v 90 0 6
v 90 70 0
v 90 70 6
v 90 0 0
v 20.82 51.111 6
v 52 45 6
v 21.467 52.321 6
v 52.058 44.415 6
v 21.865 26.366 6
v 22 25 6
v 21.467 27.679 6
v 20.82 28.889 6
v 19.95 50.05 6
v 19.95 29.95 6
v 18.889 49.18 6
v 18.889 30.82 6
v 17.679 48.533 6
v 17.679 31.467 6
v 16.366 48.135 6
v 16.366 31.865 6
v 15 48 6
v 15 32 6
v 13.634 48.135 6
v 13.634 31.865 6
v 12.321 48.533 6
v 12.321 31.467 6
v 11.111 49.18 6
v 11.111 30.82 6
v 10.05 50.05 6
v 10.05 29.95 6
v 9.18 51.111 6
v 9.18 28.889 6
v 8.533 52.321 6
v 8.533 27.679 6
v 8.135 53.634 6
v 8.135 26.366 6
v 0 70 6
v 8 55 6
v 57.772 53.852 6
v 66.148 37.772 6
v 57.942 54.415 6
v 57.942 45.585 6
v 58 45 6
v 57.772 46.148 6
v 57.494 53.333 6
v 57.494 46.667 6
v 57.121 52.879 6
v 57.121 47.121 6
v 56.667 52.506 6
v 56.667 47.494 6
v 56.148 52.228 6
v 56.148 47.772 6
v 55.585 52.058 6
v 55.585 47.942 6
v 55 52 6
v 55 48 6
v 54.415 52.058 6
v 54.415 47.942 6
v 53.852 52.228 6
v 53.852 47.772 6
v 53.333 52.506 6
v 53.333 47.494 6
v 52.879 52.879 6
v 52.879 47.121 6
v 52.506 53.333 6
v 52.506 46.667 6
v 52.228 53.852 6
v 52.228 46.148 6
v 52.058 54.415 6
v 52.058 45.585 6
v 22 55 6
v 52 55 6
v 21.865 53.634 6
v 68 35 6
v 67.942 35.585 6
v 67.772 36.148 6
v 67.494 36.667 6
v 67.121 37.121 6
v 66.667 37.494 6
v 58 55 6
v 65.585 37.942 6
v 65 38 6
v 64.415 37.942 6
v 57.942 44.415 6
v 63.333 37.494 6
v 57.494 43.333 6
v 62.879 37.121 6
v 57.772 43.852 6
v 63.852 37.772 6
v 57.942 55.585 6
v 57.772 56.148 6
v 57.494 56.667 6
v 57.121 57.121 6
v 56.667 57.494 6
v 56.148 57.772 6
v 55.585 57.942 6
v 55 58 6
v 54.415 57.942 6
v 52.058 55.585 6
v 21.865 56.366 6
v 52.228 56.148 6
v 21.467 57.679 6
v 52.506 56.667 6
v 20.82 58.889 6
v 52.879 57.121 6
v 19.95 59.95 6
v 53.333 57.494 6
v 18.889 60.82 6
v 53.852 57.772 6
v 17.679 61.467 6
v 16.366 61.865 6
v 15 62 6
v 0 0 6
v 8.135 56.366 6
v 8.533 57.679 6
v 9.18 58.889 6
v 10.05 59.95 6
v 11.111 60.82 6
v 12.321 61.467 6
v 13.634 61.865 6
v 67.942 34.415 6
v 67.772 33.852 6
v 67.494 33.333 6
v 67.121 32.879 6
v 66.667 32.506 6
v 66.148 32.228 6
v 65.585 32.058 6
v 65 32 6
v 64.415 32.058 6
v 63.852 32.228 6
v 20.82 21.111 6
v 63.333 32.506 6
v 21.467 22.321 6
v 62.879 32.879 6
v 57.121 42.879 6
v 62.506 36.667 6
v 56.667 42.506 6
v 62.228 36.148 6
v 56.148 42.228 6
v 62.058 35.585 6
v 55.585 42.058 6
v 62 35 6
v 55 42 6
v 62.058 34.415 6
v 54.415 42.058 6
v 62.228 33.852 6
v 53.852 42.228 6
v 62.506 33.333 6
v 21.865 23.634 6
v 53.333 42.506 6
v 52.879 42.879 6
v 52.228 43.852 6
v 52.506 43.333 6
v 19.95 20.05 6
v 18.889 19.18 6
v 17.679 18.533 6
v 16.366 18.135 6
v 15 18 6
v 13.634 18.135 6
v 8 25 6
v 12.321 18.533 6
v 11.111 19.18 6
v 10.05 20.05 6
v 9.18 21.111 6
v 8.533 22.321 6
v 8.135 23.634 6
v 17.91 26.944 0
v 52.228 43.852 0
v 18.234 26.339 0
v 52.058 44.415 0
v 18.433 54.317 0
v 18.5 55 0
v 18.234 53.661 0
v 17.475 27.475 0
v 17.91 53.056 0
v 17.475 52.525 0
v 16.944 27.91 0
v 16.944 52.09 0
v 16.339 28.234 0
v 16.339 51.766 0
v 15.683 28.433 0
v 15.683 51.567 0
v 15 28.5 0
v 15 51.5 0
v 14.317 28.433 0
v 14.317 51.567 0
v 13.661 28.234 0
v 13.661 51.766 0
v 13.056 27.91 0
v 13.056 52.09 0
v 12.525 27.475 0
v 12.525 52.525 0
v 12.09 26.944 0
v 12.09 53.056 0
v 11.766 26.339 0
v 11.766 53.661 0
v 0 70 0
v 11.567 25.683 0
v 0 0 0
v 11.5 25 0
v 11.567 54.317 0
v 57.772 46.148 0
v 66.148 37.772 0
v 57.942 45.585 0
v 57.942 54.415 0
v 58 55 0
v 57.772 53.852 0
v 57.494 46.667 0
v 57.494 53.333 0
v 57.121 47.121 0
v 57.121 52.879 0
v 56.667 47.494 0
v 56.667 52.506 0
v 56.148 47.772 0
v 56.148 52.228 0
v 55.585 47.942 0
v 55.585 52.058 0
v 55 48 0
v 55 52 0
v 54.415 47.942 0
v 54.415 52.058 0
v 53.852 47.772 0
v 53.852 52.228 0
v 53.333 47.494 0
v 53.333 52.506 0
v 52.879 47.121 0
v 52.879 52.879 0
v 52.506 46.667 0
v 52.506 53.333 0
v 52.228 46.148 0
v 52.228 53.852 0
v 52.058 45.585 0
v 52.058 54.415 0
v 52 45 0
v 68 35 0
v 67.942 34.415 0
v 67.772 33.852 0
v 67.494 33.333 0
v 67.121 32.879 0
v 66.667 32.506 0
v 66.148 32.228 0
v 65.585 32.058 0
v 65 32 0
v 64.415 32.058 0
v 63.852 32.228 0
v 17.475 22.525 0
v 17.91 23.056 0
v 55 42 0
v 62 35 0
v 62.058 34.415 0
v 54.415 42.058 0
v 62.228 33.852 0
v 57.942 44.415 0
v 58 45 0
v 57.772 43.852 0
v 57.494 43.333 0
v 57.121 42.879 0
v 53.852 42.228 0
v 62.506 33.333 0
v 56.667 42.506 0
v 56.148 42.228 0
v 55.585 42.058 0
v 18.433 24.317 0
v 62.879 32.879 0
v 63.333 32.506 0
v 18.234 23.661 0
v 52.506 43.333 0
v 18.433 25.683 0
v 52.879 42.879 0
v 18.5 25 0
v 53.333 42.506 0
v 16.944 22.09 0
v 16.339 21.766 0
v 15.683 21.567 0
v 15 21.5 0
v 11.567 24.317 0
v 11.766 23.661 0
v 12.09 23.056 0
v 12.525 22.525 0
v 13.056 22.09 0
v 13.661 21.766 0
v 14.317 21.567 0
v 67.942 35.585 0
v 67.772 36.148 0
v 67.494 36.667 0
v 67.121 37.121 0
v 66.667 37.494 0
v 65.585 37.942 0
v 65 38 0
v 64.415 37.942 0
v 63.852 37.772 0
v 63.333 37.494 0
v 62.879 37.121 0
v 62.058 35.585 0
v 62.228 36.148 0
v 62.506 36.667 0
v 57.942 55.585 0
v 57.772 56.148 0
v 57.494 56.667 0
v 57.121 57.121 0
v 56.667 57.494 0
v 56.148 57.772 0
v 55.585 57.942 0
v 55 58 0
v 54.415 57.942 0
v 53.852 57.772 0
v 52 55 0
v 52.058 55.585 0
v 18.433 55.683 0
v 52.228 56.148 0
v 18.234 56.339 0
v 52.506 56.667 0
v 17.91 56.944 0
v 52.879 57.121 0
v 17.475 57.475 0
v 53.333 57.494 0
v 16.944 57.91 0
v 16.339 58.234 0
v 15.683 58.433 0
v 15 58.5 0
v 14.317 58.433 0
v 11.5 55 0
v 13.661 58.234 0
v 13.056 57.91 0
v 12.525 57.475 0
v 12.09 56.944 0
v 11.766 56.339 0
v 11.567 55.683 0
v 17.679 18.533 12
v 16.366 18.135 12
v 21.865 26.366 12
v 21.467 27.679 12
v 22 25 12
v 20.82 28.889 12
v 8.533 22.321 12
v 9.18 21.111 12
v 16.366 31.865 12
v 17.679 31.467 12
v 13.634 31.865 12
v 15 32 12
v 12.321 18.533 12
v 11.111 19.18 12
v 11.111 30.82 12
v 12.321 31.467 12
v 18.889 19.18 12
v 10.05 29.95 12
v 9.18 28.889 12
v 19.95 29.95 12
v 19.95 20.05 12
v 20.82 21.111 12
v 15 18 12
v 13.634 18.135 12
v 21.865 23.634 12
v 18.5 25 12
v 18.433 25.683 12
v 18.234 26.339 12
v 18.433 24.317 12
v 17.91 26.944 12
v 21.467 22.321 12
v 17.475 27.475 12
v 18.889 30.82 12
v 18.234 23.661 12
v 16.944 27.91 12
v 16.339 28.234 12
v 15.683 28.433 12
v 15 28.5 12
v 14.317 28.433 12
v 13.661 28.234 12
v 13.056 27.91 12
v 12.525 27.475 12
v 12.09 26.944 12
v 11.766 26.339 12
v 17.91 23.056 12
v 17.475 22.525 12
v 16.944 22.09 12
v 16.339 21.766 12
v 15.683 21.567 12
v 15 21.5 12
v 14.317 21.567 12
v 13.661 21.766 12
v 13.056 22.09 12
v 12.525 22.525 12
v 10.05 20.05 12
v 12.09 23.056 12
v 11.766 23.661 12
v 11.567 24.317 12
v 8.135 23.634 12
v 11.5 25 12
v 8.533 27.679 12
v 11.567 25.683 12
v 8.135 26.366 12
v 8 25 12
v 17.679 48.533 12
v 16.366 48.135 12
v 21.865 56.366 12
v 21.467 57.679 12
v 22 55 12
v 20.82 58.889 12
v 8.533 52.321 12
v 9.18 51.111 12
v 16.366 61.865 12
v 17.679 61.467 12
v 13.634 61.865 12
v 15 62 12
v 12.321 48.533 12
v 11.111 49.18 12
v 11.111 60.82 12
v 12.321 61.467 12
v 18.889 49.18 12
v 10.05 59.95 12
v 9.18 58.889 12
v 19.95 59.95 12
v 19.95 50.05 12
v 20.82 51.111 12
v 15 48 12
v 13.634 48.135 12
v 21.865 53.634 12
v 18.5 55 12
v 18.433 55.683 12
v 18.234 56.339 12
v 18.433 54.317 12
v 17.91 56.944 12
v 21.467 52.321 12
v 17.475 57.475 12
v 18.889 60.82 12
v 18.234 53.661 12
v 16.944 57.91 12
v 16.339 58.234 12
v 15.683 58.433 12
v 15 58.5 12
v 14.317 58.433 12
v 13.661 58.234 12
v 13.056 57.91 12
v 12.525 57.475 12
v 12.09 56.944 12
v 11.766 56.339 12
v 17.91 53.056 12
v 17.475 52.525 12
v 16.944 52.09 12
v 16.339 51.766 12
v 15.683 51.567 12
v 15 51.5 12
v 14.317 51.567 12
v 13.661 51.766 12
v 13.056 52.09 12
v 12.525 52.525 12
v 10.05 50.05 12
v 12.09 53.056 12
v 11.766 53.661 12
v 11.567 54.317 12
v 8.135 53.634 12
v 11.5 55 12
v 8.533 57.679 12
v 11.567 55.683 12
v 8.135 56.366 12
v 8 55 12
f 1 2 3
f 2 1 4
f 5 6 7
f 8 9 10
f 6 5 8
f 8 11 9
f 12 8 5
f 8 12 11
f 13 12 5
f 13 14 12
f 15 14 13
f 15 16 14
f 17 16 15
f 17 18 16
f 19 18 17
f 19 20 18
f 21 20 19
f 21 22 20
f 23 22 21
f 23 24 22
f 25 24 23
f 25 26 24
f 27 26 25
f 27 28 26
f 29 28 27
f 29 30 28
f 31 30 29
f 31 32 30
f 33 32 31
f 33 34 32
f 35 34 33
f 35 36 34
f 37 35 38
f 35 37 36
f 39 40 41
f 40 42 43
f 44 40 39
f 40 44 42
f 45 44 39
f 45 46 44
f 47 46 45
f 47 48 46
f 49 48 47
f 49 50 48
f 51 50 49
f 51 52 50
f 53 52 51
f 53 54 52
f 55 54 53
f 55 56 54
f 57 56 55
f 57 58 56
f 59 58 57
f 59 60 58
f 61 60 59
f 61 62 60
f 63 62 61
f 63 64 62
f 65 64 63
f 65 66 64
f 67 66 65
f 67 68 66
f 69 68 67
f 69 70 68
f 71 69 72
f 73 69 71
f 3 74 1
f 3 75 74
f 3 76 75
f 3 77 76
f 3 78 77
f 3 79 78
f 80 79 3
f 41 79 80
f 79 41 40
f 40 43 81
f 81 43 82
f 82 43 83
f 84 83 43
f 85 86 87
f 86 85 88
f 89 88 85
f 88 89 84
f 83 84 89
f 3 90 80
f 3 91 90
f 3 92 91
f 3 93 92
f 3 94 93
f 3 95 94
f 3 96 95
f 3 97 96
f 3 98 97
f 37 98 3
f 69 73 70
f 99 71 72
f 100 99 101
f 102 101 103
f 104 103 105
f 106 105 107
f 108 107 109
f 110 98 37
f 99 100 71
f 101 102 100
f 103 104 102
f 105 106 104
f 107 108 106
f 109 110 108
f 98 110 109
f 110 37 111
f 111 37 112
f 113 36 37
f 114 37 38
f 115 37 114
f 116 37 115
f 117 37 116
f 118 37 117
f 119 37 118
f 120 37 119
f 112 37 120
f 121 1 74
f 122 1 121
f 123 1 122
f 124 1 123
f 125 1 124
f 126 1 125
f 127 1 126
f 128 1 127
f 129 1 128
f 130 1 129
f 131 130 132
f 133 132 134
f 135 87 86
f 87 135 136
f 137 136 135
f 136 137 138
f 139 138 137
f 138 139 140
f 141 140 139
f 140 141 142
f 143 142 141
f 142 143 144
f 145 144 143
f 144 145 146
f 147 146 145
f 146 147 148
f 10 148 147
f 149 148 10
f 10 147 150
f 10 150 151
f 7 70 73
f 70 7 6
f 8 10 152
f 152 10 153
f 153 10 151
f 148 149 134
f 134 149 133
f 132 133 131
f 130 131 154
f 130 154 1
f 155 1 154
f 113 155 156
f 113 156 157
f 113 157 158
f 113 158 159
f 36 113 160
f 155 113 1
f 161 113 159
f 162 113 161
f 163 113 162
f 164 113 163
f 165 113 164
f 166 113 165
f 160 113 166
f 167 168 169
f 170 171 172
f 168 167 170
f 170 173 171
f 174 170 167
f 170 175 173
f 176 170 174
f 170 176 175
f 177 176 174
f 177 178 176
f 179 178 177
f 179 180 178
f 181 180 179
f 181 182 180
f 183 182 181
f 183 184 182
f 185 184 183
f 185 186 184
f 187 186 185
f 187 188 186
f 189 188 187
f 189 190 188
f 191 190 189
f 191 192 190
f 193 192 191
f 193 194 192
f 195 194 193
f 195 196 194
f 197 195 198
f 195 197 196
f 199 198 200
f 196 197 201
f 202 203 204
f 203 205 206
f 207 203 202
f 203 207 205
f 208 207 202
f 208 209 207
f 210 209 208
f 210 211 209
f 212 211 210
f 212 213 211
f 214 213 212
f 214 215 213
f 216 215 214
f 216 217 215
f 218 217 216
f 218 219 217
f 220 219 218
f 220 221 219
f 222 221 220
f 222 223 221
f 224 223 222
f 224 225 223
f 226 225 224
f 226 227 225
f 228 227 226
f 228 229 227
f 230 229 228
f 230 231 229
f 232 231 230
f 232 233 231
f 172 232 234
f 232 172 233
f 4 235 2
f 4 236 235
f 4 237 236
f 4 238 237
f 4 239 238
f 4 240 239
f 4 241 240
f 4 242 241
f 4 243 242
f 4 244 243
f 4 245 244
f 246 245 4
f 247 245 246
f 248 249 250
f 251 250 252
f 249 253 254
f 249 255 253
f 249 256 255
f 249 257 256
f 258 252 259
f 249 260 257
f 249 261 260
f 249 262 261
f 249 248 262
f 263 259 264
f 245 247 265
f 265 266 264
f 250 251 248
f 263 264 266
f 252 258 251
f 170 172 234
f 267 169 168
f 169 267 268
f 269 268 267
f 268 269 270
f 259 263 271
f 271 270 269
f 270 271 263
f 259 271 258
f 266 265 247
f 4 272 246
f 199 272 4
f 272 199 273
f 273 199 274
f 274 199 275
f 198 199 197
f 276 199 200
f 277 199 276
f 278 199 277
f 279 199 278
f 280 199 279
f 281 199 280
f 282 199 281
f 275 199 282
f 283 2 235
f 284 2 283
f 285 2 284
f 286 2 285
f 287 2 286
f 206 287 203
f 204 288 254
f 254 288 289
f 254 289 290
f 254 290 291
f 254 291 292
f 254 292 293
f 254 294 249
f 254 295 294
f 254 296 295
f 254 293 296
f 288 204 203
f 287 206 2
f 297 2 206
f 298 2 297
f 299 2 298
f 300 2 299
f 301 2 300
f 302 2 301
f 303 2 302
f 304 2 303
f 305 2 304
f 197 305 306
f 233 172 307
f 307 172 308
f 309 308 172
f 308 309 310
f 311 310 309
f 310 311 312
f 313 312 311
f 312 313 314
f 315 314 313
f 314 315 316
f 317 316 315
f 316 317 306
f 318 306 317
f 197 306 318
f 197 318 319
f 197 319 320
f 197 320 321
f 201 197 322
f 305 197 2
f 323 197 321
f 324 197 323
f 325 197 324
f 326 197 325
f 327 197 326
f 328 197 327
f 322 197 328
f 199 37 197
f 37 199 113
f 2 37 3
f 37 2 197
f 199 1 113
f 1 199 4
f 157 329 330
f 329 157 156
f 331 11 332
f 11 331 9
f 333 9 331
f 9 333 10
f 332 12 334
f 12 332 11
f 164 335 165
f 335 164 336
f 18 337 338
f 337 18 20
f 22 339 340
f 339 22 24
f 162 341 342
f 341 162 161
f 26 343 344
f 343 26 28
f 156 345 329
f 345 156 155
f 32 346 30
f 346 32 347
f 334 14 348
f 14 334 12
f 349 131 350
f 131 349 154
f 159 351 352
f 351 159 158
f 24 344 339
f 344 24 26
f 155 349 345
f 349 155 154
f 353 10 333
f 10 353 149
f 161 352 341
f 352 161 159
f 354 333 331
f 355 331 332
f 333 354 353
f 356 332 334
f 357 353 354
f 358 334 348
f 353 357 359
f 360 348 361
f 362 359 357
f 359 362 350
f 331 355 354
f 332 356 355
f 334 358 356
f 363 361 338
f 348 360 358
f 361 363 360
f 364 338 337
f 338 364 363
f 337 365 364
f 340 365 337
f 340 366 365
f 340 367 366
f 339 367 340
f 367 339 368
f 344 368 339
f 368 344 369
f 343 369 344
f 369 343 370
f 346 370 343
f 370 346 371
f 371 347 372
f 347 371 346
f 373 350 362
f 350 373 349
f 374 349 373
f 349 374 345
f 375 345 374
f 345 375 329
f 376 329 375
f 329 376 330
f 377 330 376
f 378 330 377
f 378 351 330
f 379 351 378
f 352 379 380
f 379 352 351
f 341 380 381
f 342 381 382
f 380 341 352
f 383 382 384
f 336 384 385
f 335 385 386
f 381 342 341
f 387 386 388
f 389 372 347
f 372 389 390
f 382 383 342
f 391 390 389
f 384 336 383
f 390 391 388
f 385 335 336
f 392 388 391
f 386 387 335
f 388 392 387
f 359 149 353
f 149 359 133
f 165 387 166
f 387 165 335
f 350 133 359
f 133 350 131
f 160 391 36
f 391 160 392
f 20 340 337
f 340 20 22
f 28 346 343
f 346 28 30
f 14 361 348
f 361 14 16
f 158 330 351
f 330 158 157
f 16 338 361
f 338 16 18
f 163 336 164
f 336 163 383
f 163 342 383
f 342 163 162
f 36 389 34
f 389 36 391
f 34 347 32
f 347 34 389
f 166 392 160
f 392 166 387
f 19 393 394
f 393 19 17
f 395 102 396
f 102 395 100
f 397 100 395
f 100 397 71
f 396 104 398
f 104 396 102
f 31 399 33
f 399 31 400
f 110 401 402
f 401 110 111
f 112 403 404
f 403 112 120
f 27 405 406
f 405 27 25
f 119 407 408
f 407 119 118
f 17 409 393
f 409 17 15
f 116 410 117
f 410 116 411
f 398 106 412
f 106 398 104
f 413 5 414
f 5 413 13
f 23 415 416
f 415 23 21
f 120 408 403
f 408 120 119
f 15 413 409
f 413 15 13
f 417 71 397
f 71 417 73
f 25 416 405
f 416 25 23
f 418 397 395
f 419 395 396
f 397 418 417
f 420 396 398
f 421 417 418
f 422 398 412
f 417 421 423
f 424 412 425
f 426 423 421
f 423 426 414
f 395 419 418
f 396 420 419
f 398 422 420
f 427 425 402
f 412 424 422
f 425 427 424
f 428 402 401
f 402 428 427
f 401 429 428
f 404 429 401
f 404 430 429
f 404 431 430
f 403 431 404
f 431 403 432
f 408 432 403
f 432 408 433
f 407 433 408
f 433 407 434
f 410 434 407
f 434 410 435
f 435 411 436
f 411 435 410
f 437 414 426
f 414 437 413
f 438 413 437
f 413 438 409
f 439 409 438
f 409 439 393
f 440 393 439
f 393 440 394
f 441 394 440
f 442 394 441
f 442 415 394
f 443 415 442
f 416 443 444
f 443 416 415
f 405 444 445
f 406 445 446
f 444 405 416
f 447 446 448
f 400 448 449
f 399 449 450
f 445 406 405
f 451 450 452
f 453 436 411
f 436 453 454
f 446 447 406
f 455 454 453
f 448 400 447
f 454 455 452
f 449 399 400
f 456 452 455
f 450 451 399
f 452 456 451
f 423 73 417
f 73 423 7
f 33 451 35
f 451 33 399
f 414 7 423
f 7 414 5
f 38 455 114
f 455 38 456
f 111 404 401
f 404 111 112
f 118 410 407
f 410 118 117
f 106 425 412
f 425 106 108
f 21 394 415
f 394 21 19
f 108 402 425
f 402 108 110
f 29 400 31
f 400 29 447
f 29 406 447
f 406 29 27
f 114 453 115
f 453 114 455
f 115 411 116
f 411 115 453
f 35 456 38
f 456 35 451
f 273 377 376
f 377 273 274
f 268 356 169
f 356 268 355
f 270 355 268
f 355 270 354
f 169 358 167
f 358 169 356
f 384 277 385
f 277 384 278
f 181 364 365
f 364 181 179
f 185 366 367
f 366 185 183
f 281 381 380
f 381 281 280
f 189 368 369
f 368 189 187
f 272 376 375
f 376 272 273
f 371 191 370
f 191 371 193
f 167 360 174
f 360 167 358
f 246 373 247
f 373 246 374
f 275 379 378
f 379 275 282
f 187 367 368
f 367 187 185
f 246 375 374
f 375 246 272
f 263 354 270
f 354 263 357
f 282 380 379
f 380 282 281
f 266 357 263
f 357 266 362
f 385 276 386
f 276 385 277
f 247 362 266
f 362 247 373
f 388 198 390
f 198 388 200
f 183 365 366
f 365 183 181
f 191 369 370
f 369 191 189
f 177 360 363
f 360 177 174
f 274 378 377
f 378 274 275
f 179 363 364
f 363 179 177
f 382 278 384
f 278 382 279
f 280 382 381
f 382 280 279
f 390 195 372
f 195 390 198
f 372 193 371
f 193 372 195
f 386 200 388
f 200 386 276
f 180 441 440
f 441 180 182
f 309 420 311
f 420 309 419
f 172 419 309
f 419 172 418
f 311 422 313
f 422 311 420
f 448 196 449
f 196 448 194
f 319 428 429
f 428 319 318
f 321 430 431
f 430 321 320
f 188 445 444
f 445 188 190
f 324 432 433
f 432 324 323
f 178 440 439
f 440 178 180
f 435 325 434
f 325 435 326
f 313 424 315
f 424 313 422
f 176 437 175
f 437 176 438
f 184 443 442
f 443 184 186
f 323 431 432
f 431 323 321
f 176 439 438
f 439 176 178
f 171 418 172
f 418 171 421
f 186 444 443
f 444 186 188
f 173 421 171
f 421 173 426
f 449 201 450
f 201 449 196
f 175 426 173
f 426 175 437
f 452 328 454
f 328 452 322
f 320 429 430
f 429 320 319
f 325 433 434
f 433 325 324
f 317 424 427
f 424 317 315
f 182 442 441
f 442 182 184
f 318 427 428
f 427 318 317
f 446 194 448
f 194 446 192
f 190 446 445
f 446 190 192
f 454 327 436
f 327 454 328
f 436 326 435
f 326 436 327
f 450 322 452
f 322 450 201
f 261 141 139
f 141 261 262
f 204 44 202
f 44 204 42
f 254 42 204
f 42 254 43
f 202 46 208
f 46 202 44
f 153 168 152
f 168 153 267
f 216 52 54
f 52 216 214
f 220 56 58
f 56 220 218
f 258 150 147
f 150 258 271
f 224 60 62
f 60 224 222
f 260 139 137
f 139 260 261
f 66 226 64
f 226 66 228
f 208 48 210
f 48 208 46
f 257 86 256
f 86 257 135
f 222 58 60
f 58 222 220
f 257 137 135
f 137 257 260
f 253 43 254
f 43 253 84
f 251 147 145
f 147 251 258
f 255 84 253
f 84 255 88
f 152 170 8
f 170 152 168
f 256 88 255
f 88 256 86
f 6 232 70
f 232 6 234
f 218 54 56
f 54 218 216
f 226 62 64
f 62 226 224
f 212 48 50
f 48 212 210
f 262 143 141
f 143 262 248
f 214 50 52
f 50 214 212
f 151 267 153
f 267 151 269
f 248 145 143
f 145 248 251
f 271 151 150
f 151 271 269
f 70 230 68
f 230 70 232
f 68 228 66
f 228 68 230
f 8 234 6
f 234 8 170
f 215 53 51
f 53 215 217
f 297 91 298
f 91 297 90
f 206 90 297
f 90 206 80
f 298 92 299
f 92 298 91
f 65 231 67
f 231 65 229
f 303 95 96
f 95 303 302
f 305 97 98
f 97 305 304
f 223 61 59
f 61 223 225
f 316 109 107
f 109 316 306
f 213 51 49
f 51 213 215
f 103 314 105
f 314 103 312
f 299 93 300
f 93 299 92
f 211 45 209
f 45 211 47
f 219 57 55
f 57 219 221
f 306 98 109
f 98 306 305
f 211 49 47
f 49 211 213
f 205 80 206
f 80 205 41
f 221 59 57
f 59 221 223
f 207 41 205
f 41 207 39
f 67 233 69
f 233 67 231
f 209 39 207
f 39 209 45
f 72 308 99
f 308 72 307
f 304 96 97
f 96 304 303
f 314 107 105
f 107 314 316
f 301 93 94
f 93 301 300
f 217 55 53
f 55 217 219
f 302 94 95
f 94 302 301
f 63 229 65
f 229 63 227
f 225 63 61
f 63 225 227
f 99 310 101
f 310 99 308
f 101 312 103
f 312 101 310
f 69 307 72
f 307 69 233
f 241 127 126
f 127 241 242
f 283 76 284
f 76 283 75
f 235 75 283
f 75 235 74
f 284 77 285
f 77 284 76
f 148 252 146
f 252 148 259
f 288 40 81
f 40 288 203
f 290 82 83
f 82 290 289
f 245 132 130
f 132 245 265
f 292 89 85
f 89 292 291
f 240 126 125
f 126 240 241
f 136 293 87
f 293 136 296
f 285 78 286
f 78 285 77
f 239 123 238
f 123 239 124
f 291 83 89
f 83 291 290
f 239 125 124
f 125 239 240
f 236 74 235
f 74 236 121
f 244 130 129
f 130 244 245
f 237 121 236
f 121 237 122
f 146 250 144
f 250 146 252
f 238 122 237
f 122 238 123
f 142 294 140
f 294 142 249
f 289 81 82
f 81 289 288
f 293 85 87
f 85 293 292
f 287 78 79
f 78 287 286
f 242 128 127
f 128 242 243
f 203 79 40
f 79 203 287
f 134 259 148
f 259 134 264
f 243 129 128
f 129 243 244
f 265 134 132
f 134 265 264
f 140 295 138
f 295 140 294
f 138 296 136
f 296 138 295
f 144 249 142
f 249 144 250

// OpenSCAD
$fn = 32;

// ----------------------------------------------------------------------
// Mixed field: bosses and holes at given coordinates
// ----------------------------------------------------------------------

// --- parameters (mm) ---
plate_l = 90;             // plate length, X
plate_w = 70;             // plate width, Y
plate_t = 6;              // plate thickness, Z
boss_d = 14;              // boss diameter
boss_h = 6;               // boss height above the plate
hole_d = 6;               // through hole diameter

total_h = plate_t + boss_h;  // overall height

difference() {
  union() {
    cube([plate_l, plate_w, plate_t]);
    translate([15, 25, plate_t]) cylinder(h = boss_h, d = boss_d);
    translate([15, 55, plate_t]) cylinder(h = boss_h, d = boss_d);
  }
  translate([15, 25, -1]) cylinder(h = total_h + 2, d = boss_d / 2);
  translate([15, 55, -1]) cylinder(h = total_h + 2, d = boss_d / 2);
  translate([55, 45, -1]) cylinder(h = plate_t + 2, d = hole_d);
  translate([55, 55, -1]) cylinder(h = plate_t + 2, d = hole_d);
  translate([65, 35, -1]) cylinder(h = plate_t + 2, d = hole_d);
}
